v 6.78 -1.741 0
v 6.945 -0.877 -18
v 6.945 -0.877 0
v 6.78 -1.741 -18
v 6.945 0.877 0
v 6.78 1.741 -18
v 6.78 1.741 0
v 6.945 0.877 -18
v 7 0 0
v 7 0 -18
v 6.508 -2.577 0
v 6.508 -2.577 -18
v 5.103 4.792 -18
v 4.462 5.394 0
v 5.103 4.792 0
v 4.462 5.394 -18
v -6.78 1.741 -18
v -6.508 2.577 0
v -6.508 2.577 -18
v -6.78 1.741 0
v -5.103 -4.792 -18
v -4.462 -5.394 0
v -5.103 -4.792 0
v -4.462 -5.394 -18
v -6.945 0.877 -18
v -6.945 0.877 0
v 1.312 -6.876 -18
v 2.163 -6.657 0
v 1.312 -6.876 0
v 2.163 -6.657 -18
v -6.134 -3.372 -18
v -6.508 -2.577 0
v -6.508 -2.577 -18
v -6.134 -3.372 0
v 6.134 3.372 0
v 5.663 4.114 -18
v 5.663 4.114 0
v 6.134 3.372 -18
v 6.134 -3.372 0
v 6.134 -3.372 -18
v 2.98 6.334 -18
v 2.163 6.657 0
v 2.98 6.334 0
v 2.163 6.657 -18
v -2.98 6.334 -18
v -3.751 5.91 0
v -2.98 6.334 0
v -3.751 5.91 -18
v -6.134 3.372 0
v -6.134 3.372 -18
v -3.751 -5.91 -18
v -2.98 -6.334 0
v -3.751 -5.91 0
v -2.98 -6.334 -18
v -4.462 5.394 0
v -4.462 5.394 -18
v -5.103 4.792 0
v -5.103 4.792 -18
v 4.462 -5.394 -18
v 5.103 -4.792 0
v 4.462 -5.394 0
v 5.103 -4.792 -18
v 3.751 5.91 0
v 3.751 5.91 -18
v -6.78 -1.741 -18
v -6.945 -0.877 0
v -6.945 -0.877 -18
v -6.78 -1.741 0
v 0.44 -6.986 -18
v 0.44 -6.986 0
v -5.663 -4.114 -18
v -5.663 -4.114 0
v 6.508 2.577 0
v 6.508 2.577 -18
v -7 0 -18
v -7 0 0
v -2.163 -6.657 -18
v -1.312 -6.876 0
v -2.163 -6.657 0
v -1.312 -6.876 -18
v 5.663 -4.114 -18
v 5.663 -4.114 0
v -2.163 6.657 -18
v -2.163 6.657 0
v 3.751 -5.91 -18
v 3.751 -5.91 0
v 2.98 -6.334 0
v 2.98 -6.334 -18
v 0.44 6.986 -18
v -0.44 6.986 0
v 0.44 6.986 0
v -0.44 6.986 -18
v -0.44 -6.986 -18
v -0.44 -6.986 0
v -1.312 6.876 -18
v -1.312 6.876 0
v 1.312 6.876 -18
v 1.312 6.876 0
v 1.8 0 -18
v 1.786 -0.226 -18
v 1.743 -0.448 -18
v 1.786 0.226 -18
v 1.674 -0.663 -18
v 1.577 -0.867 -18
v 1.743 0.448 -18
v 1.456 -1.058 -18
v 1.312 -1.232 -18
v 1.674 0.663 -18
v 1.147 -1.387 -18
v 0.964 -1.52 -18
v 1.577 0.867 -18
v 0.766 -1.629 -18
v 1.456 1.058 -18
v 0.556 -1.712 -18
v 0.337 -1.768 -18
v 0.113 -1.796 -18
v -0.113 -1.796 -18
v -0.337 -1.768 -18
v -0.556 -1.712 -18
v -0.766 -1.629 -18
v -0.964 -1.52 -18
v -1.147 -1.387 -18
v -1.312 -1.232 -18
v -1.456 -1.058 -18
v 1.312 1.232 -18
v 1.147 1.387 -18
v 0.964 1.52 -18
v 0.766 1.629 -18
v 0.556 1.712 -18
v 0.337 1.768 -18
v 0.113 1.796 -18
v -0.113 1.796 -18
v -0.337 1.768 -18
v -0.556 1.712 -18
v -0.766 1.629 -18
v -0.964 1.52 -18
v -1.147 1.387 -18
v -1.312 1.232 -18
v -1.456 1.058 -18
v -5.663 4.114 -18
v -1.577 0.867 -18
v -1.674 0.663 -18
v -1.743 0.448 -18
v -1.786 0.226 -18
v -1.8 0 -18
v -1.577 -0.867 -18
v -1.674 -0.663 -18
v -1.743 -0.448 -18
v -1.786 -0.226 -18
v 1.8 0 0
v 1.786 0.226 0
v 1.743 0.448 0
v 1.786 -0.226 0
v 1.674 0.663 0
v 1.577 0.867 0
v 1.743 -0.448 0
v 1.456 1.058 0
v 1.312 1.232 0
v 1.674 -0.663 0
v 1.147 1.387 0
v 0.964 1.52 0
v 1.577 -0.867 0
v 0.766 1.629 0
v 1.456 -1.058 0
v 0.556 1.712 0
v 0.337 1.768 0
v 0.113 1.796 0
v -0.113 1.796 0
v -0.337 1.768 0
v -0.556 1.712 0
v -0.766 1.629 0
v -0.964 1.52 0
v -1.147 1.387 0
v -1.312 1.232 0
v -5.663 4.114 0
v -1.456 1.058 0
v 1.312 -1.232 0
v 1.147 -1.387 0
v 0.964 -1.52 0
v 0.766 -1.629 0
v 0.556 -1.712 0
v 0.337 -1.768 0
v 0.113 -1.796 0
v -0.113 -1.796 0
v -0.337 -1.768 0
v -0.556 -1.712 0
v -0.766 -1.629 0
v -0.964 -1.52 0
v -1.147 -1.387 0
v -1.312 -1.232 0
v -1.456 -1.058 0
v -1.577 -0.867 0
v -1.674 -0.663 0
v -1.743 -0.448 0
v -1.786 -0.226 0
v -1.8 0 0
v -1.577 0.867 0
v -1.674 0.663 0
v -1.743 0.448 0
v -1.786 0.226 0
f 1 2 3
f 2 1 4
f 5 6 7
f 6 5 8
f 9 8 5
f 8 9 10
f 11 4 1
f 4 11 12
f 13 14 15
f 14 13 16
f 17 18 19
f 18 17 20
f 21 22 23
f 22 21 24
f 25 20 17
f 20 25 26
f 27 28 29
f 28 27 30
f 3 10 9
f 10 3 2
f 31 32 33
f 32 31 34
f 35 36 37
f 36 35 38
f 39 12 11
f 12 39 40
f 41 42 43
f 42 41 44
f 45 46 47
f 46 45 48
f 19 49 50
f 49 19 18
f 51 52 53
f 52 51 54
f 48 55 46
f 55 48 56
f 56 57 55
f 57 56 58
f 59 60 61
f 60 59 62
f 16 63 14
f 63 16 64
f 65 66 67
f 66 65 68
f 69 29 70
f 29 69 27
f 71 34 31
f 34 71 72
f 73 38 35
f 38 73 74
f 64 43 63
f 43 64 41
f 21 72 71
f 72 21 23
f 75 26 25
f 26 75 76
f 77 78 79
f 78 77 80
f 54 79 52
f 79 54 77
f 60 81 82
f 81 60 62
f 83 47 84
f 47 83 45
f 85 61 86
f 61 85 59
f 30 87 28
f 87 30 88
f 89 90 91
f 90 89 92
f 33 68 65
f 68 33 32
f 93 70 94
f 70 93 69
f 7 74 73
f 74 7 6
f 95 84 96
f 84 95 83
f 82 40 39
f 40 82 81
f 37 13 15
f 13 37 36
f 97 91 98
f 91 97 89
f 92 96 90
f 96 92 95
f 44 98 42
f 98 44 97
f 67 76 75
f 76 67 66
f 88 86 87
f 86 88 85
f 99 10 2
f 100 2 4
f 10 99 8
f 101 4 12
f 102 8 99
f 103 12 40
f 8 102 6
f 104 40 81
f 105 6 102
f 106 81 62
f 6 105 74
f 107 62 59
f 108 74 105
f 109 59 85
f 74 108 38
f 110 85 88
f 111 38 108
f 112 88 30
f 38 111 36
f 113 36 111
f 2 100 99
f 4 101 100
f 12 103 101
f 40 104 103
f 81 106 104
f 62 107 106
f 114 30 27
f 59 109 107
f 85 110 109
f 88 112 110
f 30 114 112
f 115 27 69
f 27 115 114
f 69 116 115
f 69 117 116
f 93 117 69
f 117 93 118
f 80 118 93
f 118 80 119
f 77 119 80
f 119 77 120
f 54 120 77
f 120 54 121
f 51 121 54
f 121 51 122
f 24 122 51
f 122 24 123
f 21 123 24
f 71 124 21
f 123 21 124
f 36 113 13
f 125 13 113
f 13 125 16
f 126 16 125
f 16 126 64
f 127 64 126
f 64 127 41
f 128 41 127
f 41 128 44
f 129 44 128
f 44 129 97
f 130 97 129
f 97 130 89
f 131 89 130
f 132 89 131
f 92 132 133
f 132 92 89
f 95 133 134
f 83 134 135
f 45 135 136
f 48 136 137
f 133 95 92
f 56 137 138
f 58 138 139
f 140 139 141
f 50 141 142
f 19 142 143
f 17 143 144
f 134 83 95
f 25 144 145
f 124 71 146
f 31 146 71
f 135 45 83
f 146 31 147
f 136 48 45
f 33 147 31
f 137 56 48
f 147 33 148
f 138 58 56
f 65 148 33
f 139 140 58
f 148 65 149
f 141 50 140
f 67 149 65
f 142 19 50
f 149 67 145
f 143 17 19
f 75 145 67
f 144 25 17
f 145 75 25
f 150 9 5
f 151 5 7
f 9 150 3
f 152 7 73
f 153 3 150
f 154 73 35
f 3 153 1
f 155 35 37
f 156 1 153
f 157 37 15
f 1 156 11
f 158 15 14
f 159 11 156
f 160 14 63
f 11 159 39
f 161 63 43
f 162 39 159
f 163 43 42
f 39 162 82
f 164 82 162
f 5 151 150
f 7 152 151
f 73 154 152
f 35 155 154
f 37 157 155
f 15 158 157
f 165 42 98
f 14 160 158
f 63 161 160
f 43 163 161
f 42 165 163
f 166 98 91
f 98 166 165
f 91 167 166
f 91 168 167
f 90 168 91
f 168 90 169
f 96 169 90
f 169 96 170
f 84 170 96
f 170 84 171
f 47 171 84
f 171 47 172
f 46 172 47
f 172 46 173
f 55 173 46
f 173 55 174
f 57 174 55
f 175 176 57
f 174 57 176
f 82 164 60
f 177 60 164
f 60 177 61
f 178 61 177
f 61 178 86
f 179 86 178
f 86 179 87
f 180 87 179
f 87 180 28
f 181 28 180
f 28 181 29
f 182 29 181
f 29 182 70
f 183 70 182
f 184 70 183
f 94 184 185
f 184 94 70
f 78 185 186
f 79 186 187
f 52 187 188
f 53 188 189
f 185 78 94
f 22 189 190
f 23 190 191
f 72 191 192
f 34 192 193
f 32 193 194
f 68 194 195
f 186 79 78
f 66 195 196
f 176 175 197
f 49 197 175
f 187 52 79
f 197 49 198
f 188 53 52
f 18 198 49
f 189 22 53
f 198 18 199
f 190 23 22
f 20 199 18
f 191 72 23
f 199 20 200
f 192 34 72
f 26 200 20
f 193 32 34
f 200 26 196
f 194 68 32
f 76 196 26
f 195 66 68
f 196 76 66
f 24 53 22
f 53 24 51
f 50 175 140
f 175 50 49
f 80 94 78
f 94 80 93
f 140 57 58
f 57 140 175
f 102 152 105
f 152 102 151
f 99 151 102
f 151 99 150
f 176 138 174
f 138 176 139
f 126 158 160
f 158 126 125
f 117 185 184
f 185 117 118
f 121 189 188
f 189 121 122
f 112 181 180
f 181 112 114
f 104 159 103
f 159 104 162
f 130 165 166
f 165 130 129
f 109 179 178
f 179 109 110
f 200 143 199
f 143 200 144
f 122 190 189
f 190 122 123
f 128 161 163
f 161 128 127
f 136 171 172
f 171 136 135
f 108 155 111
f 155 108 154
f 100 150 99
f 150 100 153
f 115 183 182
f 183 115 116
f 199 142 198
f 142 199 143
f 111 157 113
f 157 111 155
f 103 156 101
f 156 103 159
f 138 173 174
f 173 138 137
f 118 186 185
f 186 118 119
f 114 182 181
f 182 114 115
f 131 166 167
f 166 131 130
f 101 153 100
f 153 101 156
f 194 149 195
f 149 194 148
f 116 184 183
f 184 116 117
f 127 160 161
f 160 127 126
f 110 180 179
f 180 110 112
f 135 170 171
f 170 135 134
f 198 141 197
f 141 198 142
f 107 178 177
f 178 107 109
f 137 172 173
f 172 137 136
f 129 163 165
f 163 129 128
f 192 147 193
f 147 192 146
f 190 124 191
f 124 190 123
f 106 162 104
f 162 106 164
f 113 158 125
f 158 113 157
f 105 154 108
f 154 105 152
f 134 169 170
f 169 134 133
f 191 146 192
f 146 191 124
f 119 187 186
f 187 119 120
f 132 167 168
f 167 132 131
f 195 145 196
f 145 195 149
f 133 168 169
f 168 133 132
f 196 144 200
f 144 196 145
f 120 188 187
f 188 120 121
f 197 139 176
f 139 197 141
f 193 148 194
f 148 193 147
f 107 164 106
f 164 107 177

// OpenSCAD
$fn = 50;


difference() {
	union() {
		translate(v = [0, 0, -18.0000000000]) {
			cylinder(h = 18, r = 7.0000000000);
		}
	}
	union() {
		#translate(v = [0, 0, -18]) {
			cylinder(h = 18, r = 1.8000000000);
		}
	}
}
